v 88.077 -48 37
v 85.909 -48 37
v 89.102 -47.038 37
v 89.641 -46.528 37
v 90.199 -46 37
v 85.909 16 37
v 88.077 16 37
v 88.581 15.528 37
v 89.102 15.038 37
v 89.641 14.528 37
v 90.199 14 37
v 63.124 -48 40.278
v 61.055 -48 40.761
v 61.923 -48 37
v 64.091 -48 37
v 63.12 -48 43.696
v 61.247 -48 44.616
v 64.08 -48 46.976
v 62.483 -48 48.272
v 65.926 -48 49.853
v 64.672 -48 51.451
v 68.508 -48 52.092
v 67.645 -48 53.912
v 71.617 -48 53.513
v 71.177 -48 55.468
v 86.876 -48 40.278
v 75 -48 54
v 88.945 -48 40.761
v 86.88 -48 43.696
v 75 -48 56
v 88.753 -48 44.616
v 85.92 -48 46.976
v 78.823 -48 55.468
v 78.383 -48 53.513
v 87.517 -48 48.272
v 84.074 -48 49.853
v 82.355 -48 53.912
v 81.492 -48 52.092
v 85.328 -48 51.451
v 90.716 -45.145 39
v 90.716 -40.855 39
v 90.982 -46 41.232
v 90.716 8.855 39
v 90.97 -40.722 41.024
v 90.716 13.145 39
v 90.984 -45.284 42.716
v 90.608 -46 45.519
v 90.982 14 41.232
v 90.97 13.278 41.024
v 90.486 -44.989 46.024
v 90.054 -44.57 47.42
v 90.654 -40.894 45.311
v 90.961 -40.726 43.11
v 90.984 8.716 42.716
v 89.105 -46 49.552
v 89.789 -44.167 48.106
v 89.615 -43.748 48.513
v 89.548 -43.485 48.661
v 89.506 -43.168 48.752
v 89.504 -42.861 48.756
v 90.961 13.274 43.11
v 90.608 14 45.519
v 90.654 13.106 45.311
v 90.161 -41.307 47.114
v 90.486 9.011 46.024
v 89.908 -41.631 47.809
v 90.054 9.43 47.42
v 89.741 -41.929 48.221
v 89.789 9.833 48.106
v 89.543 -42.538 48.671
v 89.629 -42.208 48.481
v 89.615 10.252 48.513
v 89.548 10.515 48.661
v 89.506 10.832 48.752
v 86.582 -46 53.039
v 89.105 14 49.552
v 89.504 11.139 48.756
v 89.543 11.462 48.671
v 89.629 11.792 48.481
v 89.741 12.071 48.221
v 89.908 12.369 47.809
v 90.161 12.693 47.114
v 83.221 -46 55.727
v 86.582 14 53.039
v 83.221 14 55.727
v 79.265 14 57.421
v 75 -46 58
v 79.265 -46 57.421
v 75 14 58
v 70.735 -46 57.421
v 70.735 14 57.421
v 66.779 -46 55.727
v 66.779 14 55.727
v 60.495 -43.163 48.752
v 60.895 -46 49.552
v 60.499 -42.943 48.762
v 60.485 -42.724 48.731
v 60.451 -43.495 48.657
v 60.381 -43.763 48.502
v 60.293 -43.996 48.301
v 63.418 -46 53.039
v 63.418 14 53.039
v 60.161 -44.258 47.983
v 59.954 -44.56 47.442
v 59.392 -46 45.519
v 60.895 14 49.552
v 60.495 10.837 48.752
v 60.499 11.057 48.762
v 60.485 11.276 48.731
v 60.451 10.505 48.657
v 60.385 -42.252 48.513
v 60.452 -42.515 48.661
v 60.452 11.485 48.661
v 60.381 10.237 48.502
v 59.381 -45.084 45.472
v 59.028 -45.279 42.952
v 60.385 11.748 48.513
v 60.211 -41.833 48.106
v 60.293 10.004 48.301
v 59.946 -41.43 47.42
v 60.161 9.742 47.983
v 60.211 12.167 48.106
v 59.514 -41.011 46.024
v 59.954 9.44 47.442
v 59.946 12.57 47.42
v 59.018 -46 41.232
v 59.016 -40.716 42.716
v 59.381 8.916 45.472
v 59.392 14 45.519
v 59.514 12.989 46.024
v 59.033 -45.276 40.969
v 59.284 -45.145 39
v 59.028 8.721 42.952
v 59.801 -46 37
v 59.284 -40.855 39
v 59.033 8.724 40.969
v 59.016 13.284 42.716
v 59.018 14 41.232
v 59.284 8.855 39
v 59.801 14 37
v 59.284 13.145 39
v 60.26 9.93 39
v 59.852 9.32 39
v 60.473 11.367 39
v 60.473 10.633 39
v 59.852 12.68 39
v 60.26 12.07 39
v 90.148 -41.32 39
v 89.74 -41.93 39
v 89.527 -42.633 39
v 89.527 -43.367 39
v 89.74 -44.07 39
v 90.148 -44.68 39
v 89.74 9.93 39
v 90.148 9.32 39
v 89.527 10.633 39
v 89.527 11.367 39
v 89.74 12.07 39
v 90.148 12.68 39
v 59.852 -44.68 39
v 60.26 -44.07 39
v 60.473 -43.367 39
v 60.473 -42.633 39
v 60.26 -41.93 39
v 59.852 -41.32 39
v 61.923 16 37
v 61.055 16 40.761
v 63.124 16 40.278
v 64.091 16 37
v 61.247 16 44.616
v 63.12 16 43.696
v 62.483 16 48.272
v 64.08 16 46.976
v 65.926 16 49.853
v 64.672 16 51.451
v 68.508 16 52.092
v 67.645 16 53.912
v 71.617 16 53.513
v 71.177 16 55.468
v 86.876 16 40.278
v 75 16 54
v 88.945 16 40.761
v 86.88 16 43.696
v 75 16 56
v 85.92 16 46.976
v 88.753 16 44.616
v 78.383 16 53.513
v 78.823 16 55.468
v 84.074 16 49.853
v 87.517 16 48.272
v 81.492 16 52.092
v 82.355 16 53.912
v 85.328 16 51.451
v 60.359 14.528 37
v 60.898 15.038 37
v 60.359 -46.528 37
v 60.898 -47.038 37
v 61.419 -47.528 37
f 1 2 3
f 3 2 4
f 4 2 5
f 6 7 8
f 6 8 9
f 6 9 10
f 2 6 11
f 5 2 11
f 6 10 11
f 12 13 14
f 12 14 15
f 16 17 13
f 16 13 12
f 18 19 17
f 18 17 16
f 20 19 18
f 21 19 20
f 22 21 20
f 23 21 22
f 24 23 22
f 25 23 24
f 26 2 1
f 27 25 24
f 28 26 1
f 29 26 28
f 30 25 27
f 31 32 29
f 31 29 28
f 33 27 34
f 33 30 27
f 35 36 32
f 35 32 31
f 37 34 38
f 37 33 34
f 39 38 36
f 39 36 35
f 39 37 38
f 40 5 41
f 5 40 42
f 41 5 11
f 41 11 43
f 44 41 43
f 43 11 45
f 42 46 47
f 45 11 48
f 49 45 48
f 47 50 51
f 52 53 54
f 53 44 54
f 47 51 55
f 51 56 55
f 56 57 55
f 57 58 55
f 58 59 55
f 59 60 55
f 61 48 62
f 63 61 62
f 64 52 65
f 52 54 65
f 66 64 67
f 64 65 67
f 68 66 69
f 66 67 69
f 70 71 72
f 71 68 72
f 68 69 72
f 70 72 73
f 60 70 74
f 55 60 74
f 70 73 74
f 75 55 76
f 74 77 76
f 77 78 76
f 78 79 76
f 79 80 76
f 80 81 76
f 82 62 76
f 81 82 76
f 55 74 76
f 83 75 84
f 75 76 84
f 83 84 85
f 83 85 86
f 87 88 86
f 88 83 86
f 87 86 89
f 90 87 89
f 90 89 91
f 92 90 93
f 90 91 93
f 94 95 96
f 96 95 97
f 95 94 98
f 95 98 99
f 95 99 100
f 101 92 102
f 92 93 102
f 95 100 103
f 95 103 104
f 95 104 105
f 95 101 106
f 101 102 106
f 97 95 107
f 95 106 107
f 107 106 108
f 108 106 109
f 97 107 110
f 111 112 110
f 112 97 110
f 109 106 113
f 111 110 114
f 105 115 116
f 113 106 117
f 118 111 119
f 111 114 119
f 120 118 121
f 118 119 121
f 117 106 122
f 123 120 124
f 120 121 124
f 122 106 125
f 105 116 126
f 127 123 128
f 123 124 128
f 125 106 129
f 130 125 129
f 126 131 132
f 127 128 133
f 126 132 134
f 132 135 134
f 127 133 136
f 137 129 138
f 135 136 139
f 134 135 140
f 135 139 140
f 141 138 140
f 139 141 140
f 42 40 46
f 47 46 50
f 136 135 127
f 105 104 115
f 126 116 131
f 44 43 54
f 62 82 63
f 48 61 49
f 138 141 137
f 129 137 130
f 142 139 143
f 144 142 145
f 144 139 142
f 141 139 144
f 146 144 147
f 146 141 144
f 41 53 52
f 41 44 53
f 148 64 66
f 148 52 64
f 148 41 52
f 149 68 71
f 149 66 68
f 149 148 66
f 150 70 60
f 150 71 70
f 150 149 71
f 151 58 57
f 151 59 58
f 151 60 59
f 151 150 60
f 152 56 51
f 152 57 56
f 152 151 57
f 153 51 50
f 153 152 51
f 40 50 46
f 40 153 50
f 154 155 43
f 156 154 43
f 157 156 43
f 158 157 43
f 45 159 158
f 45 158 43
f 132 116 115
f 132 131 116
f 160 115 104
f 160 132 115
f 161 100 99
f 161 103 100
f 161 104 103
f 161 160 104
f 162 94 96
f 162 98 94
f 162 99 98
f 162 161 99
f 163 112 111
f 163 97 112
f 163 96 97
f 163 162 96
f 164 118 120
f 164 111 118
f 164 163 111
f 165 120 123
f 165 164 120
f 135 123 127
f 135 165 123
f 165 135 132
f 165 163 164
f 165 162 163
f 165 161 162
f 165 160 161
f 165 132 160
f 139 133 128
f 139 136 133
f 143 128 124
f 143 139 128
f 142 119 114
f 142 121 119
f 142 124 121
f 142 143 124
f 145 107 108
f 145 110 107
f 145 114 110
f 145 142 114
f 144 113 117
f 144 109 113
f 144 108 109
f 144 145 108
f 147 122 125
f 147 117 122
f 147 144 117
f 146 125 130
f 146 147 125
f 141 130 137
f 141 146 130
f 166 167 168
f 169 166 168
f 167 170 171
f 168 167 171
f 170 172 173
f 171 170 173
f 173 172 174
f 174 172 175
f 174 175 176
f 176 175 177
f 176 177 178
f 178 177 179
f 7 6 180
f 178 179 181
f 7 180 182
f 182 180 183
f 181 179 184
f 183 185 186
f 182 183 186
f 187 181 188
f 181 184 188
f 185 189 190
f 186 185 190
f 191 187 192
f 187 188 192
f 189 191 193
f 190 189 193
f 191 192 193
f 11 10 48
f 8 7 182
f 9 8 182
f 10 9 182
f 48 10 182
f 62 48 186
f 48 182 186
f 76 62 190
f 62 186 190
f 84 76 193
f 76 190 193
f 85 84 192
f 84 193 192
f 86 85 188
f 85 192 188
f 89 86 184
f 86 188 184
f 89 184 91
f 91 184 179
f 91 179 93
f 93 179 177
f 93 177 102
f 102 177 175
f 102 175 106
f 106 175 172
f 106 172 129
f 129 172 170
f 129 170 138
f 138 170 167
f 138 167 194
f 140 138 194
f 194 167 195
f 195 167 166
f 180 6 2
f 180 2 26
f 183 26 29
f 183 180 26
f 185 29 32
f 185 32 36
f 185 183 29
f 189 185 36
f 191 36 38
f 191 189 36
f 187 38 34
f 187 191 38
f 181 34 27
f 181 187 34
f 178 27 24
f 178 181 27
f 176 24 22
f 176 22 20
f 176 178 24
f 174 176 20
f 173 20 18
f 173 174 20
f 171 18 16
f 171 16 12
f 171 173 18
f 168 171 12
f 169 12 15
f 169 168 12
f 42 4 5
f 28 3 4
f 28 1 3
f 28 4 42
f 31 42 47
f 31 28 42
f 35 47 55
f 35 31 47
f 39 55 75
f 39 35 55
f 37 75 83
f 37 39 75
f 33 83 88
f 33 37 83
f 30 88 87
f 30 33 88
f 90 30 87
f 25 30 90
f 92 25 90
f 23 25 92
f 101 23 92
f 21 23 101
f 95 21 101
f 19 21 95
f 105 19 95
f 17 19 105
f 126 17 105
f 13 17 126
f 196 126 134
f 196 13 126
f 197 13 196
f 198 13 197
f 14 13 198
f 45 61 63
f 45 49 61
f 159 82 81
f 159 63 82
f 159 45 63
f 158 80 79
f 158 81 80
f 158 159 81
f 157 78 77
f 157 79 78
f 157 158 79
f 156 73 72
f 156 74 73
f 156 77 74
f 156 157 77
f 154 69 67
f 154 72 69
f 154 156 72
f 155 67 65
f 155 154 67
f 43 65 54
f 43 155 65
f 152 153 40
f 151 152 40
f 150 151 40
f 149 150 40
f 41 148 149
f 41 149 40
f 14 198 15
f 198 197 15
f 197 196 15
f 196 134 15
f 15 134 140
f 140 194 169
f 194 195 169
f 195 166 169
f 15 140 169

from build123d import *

# Parameters (mm, degrees)
CYLINDER1804_R     = 2.5
CYLINDER1804_DEPTH = 30
CYLINDER1805_R     = 2.5
CYLINDER1805_DEPTH = 30
CYLINDER1803_R     = 2.5
CYLINDER1803_DEPTH = 30
CYLINDER1802_R     = 2.5
CYLINDER1802_DEPTH = 30
BOX715_W           = 100
BOX715_H           = 100
BOX715_DEPTH       = 100
TUBE089_R          = 16
TUBE089_R_2        = 12
TUBE089_DEPTH      = 64
CHAMFER060_SIZE    = 2


with BuildPart() as v_lec1804:
    # Cylinder1804 → Cylinder1804 (new body)
    with BuildSketch(Plane(origin=(58, -43, 26), x_dir=(1, 0, 0), z_dir=(0, 0, 1))):
        Circle(CYLINDER1804_R)
    extrude(amount=CYLINDER1804_DEPTH)


with BuildPart() as compound911:
    # Cylinder1805 → Cylinder1805 (new body)
    with BuildSketch(Plane(origin=(58, 11, 26), x_dir=(1, 0, 0), z_dir=(0, 0, 1))):
        Circle(CYLINDER1805_R)
    extrude(amount=CYLINDER1805_DEPTH)

    # Compound911: union Válec1804
    add(v_lec1804.part)


with BuildPart() as compound911_1:
    # Compound911 placement: moved
    add(compound911.part.moved(Location((34, 0, 13))))


with BuildPart() as v_lec1803:
    # Cylinder1803 → Cylinder1803 (new body)
    with BuildSketch(Plane(origin=(58, -43, 26), x_dir=(1, 0, 0), z_dir=(0, 0, 1))):
        Circle(CYLINDER1803_R)
    extrude(amount=CYLINDER1803_DEPTH)


with BuildPart() as compound912:
    # Cylinder1802 → Cylinder1802 (new body)
    with BuildSketch(Plane(origin=(58, 11, 26), x_dir=(1, 0, 0), z_dir=(0, 0, 1))):
        Circle(CYLINDER1802_R)
    extrude(amount=CYLINDER1802_DEPTH)

    # Compound910: union Válec1803
    add(v_lec1803.part)


with BuildPart() as compound912_1:
    # Compound910 placement: moved
    add(compound912.part.moved(Location((0, 0, 13))))

    # Compound912: union Compound911
    add(compound911_1.part)


with BuildPart() as krychle715:
    # Box715 → Box715 (new body)
    with BuildSketch(Plane(origin=(32, -54, -63), x_dir=(1, 0, 0), z_dir=(0, 0, 1))):
        with Locations((50, 50)):
            Rectangle(BOX715_W, BOX715_H)
    extrude(amount=BOX715_DEPTH)


with BuildPart() as cut532:
    # Tube089 → Tube089 (new body)
    with BuildSketch(Plane(origin=(75, 16, 42), x_dir=(1, 0, 0), z_dir=(0, -1, 0))):
        Circle(TUBE089_R)
        Circle(TUBE089_R_2, mode=Mode.SUBTRACT)
    extrude(amount=TUBE089_DEPTH)

    # Chamfer060
    chamfer060_edges = [cut532.edges().sort_by_distance(p)[0] for p in [
        (59, -48, 42),
        (59, 16, 42),
    ]]
    chamfer(chamfer060_edges, length=CHAMFER060_SIZE)

    # Cut535: cut Krychle715
    add(krychle715.part, mode=Mode.SUBTRACT)

    # Cut532: cut Compound912
    add(compound912_1.part, mode=Mode.SUBTRACT)


solid = cut532.part
